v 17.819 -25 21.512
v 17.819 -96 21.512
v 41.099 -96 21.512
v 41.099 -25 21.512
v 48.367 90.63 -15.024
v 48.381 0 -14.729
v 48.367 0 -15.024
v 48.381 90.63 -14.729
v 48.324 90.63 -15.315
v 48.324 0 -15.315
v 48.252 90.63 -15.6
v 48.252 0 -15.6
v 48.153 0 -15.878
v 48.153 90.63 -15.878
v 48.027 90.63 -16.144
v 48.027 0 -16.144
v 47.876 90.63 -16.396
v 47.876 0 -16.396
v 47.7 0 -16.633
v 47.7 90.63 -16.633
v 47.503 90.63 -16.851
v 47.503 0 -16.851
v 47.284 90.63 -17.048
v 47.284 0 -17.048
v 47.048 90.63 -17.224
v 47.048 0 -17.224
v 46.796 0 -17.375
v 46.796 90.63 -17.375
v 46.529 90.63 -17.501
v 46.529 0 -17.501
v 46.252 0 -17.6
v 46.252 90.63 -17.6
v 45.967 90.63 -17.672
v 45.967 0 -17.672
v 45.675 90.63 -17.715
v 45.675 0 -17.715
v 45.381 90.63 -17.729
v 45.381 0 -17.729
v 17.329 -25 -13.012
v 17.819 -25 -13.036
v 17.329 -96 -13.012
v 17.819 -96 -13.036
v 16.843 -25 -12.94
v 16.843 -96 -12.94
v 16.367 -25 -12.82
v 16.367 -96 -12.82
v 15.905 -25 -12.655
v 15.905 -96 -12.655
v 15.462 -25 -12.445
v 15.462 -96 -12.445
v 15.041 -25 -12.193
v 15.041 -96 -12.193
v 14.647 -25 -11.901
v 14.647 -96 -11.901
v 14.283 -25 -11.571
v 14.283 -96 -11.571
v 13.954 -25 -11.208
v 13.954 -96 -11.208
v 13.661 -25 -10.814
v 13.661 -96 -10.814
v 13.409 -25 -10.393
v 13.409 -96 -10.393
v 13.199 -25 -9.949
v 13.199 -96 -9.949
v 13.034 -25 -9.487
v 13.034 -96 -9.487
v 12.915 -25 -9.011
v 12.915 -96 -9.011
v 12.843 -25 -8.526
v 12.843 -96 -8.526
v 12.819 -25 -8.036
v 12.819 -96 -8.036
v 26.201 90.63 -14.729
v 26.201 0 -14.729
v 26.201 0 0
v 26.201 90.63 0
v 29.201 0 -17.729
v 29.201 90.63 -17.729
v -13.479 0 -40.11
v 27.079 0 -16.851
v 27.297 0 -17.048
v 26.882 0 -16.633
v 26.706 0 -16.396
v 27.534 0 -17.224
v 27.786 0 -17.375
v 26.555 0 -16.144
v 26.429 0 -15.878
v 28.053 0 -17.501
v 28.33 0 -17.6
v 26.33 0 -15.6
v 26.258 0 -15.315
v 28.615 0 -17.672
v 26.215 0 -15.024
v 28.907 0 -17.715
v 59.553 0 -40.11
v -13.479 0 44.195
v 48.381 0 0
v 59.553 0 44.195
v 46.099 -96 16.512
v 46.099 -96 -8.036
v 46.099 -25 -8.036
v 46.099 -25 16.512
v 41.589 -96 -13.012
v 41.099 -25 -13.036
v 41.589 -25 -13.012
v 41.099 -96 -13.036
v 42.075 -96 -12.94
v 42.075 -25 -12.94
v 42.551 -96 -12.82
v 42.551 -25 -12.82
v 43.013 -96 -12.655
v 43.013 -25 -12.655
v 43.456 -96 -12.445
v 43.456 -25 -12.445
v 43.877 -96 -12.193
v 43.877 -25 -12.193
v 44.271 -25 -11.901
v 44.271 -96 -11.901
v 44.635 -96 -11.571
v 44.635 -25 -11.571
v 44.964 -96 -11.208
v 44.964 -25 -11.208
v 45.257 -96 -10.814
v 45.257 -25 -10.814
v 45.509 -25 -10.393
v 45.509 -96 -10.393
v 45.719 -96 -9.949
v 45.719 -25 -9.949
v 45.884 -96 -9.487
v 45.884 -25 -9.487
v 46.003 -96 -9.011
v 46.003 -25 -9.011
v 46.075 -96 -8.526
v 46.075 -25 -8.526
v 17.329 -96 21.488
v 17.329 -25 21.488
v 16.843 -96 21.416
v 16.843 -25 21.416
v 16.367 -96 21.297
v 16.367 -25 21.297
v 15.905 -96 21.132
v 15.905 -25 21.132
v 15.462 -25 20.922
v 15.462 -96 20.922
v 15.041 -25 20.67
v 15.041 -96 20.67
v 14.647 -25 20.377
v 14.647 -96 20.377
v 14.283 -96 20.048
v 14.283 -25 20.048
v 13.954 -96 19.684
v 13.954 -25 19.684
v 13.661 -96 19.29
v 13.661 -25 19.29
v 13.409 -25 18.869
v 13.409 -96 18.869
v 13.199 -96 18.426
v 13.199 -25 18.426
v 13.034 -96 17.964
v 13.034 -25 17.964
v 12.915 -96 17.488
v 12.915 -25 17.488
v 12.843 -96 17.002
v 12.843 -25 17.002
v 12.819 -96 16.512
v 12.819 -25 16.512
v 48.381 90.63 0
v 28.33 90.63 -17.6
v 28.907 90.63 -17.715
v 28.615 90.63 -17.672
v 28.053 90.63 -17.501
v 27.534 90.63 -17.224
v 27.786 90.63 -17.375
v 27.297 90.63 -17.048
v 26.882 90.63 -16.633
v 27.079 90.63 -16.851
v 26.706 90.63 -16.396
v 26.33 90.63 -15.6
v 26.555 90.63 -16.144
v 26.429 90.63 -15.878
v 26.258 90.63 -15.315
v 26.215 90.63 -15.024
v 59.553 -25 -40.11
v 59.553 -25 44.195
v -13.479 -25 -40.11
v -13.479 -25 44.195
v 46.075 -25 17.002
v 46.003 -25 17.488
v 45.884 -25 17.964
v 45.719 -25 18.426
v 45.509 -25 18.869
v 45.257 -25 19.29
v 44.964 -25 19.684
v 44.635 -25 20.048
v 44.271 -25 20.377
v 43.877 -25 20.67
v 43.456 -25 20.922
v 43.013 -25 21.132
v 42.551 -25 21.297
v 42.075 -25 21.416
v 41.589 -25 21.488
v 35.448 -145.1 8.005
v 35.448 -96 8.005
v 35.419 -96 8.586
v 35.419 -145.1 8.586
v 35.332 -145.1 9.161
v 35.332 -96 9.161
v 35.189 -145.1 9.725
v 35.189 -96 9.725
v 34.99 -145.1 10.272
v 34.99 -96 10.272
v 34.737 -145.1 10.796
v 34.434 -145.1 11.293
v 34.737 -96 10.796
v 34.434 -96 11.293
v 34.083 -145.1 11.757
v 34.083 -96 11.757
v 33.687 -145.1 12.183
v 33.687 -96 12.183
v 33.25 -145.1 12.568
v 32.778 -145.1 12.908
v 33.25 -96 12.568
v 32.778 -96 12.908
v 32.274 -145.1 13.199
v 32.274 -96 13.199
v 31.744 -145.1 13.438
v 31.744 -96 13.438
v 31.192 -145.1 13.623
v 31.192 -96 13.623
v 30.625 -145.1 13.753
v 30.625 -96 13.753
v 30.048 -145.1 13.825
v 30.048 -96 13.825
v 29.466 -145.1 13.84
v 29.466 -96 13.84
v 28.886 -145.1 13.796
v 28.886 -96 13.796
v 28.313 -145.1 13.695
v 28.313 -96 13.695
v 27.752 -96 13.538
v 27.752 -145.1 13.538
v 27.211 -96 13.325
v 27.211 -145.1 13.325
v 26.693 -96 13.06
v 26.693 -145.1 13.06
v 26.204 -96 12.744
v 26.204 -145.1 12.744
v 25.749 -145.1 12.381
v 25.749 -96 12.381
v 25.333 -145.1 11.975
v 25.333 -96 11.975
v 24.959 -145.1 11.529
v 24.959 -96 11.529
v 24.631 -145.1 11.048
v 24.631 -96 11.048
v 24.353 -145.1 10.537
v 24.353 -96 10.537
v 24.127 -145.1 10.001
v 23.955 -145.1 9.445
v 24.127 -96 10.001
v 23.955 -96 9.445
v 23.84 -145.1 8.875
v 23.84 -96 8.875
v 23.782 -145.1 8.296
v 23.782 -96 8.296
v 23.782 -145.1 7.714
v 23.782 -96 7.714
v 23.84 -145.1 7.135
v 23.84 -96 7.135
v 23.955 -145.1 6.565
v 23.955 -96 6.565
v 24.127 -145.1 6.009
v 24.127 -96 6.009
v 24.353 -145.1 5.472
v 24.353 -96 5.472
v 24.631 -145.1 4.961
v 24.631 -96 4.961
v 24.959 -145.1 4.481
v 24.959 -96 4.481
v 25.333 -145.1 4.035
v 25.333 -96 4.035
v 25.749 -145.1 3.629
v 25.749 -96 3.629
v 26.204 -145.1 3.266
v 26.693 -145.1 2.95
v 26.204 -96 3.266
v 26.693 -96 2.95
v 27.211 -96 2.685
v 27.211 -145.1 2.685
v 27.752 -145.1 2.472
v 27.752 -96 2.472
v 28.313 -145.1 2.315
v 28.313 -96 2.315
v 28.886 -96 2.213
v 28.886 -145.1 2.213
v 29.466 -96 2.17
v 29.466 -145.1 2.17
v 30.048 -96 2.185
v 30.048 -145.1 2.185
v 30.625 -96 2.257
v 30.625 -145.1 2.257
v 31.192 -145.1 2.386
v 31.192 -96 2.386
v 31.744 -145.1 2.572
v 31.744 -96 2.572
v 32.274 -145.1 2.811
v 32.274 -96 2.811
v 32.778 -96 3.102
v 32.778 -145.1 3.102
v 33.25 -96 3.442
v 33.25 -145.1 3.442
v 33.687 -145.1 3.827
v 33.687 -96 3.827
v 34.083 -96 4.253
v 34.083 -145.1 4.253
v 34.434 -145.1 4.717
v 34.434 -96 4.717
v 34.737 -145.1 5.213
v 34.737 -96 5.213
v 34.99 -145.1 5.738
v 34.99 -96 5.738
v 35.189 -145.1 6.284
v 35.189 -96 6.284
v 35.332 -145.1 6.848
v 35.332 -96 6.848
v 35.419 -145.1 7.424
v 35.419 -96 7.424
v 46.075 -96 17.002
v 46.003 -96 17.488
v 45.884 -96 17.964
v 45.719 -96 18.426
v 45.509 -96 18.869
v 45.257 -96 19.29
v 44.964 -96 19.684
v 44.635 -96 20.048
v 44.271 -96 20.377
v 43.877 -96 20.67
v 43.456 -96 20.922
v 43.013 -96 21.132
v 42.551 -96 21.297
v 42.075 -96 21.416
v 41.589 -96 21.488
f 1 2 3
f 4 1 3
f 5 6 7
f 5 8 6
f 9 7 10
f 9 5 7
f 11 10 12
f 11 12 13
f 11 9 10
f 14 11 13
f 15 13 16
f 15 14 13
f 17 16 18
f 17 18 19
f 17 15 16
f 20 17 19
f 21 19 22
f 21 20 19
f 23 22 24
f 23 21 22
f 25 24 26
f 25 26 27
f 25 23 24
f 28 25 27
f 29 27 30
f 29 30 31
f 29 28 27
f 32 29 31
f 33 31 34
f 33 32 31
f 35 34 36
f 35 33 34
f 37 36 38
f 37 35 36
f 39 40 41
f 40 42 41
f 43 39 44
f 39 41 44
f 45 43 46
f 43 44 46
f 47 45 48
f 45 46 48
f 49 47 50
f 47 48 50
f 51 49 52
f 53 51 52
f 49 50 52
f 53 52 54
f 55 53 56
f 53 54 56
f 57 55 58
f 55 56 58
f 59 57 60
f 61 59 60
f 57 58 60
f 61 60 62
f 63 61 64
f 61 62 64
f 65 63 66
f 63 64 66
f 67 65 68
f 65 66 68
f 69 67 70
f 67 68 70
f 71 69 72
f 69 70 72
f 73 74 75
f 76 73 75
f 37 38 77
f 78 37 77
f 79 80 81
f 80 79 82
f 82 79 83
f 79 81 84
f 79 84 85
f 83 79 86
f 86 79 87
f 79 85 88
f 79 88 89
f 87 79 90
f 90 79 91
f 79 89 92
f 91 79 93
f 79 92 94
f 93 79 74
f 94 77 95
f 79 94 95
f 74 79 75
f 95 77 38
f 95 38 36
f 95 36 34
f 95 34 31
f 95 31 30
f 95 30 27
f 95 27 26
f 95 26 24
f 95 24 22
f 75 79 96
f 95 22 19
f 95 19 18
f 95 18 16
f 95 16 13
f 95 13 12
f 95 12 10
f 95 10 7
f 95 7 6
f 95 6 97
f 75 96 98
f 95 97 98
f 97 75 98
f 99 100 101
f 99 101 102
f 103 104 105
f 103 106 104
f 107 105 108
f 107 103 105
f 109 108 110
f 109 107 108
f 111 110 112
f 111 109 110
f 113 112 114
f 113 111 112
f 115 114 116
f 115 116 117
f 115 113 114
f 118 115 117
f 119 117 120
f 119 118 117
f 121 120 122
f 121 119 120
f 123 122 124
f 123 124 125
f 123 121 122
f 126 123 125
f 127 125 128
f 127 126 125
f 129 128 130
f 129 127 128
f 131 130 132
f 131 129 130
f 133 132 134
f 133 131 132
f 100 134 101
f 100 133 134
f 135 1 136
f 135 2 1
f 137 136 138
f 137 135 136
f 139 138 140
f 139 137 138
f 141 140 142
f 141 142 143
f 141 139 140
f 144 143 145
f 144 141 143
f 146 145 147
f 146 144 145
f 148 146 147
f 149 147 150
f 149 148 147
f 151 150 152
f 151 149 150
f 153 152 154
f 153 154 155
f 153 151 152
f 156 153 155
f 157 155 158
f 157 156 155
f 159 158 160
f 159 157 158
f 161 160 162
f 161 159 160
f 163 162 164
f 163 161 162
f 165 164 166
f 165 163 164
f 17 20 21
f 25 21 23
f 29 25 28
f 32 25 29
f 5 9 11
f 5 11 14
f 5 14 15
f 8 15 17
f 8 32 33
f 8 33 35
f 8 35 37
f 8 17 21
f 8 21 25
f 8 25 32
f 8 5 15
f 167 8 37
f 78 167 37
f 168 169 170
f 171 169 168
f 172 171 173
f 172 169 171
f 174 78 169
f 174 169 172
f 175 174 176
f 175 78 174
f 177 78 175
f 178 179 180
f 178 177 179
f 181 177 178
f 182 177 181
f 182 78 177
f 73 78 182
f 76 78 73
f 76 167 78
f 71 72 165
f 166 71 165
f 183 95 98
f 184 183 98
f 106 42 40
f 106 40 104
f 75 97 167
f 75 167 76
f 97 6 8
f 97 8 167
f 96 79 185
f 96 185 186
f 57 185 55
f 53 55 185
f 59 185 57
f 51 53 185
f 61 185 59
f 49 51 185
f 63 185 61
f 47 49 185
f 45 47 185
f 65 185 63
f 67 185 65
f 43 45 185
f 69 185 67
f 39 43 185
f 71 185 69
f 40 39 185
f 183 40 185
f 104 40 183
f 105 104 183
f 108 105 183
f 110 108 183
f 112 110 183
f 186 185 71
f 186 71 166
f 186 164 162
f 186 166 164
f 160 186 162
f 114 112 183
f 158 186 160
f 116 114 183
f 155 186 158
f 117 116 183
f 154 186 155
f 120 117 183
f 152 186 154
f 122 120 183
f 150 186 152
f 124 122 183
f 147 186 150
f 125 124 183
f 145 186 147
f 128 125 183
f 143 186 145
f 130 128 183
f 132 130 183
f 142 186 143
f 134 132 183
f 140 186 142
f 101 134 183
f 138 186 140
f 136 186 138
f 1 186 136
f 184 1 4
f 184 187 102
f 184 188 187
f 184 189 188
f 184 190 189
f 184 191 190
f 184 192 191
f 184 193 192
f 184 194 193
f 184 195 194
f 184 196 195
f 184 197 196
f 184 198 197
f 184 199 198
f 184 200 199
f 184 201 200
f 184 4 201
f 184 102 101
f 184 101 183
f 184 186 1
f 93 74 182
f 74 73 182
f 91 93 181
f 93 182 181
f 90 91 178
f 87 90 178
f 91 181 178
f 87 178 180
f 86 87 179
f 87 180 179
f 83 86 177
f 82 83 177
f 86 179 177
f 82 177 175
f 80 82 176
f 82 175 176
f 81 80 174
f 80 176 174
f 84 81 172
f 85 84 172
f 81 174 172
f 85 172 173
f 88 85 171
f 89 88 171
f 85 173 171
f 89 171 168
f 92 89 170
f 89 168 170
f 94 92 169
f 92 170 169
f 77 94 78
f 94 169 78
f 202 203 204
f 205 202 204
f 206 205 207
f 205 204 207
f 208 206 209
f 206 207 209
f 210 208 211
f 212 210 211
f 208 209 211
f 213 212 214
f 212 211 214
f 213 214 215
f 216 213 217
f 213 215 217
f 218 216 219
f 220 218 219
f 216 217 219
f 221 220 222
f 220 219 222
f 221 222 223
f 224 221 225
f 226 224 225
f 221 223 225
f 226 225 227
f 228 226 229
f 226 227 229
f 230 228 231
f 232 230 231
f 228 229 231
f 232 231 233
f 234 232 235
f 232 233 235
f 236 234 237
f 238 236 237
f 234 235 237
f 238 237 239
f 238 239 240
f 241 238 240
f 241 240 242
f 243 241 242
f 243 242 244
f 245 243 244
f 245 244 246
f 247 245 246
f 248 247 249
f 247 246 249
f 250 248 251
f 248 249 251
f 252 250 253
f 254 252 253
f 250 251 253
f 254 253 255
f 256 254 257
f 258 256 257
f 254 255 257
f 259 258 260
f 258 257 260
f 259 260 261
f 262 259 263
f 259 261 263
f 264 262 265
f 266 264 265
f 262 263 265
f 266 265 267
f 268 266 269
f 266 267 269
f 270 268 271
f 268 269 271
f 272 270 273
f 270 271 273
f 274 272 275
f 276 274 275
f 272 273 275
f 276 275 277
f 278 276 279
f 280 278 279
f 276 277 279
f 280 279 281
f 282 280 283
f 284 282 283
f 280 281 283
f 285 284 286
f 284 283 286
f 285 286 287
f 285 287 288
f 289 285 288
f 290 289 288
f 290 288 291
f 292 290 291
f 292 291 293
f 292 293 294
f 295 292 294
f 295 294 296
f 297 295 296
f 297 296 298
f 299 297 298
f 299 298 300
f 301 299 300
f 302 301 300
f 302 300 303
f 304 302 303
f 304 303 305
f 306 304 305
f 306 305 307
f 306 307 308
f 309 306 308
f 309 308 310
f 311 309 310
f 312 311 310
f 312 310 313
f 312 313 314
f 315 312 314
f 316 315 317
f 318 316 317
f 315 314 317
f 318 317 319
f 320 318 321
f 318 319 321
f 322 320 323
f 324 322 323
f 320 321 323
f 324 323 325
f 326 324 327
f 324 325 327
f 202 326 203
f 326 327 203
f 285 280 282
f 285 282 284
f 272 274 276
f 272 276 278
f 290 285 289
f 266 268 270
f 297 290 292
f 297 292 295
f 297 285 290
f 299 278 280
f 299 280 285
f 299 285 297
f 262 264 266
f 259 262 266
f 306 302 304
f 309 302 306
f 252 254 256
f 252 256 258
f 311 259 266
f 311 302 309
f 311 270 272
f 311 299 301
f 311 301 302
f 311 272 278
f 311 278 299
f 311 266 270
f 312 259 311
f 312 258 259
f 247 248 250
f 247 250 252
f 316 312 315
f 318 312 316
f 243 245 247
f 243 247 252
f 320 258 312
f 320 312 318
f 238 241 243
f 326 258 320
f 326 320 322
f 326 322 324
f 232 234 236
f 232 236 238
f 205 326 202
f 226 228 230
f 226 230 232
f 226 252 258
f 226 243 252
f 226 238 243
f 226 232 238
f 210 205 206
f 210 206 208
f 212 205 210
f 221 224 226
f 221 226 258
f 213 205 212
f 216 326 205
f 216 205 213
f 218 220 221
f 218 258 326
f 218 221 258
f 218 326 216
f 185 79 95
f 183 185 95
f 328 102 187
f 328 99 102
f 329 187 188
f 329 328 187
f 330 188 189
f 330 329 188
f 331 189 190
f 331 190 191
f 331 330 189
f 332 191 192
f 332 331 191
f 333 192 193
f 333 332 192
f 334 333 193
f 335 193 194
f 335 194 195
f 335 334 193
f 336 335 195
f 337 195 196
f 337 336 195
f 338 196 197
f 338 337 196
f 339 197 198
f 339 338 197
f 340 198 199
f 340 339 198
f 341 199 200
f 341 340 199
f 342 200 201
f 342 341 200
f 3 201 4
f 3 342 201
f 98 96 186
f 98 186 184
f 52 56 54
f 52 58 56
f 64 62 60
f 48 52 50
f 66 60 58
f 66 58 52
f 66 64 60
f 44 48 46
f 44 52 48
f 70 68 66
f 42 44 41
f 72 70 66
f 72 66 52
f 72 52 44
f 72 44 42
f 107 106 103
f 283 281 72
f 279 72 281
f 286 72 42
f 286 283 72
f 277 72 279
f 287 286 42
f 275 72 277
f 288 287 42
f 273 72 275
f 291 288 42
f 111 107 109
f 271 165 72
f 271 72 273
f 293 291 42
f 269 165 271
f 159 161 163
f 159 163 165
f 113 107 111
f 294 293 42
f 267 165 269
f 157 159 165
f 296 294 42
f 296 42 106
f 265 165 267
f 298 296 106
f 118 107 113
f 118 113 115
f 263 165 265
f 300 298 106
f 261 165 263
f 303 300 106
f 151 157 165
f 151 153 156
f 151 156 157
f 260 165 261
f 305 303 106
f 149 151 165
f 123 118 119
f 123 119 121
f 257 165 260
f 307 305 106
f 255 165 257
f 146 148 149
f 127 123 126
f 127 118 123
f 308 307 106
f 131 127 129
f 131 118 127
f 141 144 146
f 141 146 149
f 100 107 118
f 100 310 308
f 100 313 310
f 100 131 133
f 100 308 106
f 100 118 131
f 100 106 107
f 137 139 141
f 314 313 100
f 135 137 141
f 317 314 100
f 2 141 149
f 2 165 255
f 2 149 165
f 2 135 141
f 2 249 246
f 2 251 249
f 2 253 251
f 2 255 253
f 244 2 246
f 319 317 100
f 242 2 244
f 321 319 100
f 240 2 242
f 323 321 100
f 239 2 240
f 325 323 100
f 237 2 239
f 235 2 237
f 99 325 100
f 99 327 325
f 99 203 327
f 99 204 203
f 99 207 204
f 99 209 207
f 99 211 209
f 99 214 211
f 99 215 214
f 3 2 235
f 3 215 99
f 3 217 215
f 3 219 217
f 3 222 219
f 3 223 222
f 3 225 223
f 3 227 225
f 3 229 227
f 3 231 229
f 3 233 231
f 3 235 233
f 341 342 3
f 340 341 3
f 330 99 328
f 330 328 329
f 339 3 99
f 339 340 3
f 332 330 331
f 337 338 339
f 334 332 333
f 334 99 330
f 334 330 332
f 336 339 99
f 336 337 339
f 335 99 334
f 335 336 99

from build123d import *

# Parameters (mm, degrees)
F0_W     = 73.031641
F0_H     = 84.304981
F1_DEPTH = 25
F2_W     = 33.280658
F2_H     = 34.5481
F3_DEPTH = 71
F4_R     = 5
F5_R     = 5.836703
F6_DEPTH = 49.1
F7_W     = 22.180748
F7_H     = 17.729454
F8_DEPTH = 90.629987
F9_R     = 3


with BuildPart() as f1:
    # F0 (on Front) → F1 (new body)
    with BuildSketch(Plane.XZ):
        with Locations((23.036827, 2.042271)):
            Rectangle(F0_W, F0_H)
    extrude(amount=F1_DEPTH)

    # F2 (on face) → F3 (join)
    with BuildSketch(Plane.XZ.offset(25)):
        with Locations((29.459043, 4.238339)):
            Rectangle(F2_W, F2_H)
    extrude(amount=F3_DEPTH)

    # F4
    f4_edges = [f1.edges().sort_by_distance(p)[0] for p in [
        (46.099372, -60.5, -13.035711),
        (46.099372, -60.5, 21.512389),
        (12.818714, -60.5, 21.512389),
        (12.818714, -60.5, -13.035711),
    ]]
    fillet(f4_edges, radius=F4_R)

    # F5 (on face) → F6 (join)
    with BuildSketch(Plane.XZ.offset(96)):
        with Locations((29.61137, 8.004888)):
            Circle(F5_R)
    extrude(amount=F6_DEPTH)

    # F7 (on face) → F8 (join)
    with BuildSketch(Plane(origin=(0, 0, 0), x_dir=(-1, 0, 0), z_dir=(0, 1, 0))):
        with Locations((-37.29094, -8.864727)):
            Rectangle(F7_W, F7_H)
    extrude(amount=F8_DEPTH)

    # F9
    f9_edges = [f1.edges().sort_by_distance(p)[0] for p in [
        (26.200566, 45.314994, -17.729454),
        (48.381314, 45.314994, -17.729454),
    ]]
    fillet(f9_edges, radius=F9_R)


solid = f1.part
